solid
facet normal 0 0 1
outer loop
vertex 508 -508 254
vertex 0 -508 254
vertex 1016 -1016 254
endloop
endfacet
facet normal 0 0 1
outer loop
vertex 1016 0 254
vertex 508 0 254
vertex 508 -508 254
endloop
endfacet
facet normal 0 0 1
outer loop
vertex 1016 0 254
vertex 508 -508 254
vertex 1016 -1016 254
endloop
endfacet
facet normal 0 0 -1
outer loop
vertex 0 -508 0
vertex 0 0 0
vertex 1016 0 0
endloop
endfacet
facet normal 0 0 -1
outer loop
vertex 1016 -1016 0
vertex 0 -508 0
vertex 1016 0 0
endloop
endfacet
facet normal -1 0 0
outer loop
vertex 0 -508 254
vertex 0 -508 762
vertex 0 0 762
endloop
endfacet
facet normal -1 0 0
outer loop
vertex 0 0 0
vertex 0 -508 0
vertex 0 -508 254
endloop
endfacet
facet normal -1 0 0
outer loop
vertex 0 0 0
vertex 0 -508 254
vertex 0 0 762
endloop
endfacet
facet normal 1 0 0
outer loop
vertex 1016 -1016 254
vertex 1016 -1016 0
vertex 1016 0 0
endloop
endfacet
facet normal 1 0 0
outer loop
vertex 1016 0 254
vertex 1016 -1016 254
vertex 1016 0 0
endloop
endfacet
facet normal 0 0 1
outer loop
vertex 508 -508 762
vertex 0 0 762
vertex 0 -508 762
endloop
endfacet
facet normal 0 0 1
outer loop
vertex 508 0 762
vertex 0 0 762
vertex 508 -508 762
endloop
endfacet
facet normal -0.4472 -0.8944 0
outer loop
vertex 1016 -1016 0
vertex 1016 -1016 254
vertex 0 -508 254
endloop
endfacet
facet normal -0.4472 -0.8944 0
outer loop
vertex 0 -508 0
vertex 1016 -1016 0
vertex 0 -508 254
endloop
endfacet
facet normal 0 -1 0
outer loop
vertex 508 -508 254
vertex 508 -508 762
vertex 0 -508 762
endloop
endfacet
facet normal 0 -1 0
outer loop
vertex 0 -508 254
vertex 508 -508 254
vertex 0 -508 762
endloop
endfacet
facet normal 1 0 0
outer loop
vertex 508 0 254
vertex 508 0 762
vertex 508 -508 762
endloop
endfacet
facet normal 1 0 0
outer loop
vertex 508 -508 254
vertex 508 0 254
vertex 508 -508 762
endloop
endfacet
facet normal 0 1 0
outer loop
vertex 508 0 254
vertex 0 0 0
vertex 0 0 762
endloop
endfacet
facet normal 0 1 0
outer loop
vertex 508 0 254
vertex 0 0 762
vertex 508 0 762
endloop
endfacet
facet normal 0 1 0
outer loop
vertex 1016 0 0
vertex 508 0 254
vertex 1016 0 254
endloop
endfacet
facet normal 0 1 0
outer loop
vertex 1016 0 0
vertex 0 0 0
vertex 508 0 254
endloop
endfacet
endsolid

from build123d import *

# Parameters (mm, degrees)
F0_W     = 1016
F0_H     = 1016
F1_DEPTH = 762
F3_DEPTH = 508
F5_DEPTH = 254


with BuildPart() as f1:
    # F0 (on Top) → F1 (new body)
    with BuildSketch(Plane.XY):
        with Locations((508, -508)):
            Rectangle(F0_W, F0_H)
    extrude(amount=F1_DEPTH)

    # F2 (on face) → F3 (cut)
    with BuildSketch(Plane.XY.offset(762)):
        Polygon((1016, 0), (508, 0), (508, -508), (0, -508), (0, -1016), (1016, -1016), align=None)
    extrude(amount=-F3_DEPTH, mode=Mode.SUBTRACT)

    # F4 (on face) → F5 (cut)
    with BuildSketch(Plane.XY.offset(254)):
        Polygon((1016, -1016), (0, -508), (0, -1016), align=None)
    extrude(amount=-F5_DEPTH, mode=Mode.SUBTRACT)


solid = f1.part
